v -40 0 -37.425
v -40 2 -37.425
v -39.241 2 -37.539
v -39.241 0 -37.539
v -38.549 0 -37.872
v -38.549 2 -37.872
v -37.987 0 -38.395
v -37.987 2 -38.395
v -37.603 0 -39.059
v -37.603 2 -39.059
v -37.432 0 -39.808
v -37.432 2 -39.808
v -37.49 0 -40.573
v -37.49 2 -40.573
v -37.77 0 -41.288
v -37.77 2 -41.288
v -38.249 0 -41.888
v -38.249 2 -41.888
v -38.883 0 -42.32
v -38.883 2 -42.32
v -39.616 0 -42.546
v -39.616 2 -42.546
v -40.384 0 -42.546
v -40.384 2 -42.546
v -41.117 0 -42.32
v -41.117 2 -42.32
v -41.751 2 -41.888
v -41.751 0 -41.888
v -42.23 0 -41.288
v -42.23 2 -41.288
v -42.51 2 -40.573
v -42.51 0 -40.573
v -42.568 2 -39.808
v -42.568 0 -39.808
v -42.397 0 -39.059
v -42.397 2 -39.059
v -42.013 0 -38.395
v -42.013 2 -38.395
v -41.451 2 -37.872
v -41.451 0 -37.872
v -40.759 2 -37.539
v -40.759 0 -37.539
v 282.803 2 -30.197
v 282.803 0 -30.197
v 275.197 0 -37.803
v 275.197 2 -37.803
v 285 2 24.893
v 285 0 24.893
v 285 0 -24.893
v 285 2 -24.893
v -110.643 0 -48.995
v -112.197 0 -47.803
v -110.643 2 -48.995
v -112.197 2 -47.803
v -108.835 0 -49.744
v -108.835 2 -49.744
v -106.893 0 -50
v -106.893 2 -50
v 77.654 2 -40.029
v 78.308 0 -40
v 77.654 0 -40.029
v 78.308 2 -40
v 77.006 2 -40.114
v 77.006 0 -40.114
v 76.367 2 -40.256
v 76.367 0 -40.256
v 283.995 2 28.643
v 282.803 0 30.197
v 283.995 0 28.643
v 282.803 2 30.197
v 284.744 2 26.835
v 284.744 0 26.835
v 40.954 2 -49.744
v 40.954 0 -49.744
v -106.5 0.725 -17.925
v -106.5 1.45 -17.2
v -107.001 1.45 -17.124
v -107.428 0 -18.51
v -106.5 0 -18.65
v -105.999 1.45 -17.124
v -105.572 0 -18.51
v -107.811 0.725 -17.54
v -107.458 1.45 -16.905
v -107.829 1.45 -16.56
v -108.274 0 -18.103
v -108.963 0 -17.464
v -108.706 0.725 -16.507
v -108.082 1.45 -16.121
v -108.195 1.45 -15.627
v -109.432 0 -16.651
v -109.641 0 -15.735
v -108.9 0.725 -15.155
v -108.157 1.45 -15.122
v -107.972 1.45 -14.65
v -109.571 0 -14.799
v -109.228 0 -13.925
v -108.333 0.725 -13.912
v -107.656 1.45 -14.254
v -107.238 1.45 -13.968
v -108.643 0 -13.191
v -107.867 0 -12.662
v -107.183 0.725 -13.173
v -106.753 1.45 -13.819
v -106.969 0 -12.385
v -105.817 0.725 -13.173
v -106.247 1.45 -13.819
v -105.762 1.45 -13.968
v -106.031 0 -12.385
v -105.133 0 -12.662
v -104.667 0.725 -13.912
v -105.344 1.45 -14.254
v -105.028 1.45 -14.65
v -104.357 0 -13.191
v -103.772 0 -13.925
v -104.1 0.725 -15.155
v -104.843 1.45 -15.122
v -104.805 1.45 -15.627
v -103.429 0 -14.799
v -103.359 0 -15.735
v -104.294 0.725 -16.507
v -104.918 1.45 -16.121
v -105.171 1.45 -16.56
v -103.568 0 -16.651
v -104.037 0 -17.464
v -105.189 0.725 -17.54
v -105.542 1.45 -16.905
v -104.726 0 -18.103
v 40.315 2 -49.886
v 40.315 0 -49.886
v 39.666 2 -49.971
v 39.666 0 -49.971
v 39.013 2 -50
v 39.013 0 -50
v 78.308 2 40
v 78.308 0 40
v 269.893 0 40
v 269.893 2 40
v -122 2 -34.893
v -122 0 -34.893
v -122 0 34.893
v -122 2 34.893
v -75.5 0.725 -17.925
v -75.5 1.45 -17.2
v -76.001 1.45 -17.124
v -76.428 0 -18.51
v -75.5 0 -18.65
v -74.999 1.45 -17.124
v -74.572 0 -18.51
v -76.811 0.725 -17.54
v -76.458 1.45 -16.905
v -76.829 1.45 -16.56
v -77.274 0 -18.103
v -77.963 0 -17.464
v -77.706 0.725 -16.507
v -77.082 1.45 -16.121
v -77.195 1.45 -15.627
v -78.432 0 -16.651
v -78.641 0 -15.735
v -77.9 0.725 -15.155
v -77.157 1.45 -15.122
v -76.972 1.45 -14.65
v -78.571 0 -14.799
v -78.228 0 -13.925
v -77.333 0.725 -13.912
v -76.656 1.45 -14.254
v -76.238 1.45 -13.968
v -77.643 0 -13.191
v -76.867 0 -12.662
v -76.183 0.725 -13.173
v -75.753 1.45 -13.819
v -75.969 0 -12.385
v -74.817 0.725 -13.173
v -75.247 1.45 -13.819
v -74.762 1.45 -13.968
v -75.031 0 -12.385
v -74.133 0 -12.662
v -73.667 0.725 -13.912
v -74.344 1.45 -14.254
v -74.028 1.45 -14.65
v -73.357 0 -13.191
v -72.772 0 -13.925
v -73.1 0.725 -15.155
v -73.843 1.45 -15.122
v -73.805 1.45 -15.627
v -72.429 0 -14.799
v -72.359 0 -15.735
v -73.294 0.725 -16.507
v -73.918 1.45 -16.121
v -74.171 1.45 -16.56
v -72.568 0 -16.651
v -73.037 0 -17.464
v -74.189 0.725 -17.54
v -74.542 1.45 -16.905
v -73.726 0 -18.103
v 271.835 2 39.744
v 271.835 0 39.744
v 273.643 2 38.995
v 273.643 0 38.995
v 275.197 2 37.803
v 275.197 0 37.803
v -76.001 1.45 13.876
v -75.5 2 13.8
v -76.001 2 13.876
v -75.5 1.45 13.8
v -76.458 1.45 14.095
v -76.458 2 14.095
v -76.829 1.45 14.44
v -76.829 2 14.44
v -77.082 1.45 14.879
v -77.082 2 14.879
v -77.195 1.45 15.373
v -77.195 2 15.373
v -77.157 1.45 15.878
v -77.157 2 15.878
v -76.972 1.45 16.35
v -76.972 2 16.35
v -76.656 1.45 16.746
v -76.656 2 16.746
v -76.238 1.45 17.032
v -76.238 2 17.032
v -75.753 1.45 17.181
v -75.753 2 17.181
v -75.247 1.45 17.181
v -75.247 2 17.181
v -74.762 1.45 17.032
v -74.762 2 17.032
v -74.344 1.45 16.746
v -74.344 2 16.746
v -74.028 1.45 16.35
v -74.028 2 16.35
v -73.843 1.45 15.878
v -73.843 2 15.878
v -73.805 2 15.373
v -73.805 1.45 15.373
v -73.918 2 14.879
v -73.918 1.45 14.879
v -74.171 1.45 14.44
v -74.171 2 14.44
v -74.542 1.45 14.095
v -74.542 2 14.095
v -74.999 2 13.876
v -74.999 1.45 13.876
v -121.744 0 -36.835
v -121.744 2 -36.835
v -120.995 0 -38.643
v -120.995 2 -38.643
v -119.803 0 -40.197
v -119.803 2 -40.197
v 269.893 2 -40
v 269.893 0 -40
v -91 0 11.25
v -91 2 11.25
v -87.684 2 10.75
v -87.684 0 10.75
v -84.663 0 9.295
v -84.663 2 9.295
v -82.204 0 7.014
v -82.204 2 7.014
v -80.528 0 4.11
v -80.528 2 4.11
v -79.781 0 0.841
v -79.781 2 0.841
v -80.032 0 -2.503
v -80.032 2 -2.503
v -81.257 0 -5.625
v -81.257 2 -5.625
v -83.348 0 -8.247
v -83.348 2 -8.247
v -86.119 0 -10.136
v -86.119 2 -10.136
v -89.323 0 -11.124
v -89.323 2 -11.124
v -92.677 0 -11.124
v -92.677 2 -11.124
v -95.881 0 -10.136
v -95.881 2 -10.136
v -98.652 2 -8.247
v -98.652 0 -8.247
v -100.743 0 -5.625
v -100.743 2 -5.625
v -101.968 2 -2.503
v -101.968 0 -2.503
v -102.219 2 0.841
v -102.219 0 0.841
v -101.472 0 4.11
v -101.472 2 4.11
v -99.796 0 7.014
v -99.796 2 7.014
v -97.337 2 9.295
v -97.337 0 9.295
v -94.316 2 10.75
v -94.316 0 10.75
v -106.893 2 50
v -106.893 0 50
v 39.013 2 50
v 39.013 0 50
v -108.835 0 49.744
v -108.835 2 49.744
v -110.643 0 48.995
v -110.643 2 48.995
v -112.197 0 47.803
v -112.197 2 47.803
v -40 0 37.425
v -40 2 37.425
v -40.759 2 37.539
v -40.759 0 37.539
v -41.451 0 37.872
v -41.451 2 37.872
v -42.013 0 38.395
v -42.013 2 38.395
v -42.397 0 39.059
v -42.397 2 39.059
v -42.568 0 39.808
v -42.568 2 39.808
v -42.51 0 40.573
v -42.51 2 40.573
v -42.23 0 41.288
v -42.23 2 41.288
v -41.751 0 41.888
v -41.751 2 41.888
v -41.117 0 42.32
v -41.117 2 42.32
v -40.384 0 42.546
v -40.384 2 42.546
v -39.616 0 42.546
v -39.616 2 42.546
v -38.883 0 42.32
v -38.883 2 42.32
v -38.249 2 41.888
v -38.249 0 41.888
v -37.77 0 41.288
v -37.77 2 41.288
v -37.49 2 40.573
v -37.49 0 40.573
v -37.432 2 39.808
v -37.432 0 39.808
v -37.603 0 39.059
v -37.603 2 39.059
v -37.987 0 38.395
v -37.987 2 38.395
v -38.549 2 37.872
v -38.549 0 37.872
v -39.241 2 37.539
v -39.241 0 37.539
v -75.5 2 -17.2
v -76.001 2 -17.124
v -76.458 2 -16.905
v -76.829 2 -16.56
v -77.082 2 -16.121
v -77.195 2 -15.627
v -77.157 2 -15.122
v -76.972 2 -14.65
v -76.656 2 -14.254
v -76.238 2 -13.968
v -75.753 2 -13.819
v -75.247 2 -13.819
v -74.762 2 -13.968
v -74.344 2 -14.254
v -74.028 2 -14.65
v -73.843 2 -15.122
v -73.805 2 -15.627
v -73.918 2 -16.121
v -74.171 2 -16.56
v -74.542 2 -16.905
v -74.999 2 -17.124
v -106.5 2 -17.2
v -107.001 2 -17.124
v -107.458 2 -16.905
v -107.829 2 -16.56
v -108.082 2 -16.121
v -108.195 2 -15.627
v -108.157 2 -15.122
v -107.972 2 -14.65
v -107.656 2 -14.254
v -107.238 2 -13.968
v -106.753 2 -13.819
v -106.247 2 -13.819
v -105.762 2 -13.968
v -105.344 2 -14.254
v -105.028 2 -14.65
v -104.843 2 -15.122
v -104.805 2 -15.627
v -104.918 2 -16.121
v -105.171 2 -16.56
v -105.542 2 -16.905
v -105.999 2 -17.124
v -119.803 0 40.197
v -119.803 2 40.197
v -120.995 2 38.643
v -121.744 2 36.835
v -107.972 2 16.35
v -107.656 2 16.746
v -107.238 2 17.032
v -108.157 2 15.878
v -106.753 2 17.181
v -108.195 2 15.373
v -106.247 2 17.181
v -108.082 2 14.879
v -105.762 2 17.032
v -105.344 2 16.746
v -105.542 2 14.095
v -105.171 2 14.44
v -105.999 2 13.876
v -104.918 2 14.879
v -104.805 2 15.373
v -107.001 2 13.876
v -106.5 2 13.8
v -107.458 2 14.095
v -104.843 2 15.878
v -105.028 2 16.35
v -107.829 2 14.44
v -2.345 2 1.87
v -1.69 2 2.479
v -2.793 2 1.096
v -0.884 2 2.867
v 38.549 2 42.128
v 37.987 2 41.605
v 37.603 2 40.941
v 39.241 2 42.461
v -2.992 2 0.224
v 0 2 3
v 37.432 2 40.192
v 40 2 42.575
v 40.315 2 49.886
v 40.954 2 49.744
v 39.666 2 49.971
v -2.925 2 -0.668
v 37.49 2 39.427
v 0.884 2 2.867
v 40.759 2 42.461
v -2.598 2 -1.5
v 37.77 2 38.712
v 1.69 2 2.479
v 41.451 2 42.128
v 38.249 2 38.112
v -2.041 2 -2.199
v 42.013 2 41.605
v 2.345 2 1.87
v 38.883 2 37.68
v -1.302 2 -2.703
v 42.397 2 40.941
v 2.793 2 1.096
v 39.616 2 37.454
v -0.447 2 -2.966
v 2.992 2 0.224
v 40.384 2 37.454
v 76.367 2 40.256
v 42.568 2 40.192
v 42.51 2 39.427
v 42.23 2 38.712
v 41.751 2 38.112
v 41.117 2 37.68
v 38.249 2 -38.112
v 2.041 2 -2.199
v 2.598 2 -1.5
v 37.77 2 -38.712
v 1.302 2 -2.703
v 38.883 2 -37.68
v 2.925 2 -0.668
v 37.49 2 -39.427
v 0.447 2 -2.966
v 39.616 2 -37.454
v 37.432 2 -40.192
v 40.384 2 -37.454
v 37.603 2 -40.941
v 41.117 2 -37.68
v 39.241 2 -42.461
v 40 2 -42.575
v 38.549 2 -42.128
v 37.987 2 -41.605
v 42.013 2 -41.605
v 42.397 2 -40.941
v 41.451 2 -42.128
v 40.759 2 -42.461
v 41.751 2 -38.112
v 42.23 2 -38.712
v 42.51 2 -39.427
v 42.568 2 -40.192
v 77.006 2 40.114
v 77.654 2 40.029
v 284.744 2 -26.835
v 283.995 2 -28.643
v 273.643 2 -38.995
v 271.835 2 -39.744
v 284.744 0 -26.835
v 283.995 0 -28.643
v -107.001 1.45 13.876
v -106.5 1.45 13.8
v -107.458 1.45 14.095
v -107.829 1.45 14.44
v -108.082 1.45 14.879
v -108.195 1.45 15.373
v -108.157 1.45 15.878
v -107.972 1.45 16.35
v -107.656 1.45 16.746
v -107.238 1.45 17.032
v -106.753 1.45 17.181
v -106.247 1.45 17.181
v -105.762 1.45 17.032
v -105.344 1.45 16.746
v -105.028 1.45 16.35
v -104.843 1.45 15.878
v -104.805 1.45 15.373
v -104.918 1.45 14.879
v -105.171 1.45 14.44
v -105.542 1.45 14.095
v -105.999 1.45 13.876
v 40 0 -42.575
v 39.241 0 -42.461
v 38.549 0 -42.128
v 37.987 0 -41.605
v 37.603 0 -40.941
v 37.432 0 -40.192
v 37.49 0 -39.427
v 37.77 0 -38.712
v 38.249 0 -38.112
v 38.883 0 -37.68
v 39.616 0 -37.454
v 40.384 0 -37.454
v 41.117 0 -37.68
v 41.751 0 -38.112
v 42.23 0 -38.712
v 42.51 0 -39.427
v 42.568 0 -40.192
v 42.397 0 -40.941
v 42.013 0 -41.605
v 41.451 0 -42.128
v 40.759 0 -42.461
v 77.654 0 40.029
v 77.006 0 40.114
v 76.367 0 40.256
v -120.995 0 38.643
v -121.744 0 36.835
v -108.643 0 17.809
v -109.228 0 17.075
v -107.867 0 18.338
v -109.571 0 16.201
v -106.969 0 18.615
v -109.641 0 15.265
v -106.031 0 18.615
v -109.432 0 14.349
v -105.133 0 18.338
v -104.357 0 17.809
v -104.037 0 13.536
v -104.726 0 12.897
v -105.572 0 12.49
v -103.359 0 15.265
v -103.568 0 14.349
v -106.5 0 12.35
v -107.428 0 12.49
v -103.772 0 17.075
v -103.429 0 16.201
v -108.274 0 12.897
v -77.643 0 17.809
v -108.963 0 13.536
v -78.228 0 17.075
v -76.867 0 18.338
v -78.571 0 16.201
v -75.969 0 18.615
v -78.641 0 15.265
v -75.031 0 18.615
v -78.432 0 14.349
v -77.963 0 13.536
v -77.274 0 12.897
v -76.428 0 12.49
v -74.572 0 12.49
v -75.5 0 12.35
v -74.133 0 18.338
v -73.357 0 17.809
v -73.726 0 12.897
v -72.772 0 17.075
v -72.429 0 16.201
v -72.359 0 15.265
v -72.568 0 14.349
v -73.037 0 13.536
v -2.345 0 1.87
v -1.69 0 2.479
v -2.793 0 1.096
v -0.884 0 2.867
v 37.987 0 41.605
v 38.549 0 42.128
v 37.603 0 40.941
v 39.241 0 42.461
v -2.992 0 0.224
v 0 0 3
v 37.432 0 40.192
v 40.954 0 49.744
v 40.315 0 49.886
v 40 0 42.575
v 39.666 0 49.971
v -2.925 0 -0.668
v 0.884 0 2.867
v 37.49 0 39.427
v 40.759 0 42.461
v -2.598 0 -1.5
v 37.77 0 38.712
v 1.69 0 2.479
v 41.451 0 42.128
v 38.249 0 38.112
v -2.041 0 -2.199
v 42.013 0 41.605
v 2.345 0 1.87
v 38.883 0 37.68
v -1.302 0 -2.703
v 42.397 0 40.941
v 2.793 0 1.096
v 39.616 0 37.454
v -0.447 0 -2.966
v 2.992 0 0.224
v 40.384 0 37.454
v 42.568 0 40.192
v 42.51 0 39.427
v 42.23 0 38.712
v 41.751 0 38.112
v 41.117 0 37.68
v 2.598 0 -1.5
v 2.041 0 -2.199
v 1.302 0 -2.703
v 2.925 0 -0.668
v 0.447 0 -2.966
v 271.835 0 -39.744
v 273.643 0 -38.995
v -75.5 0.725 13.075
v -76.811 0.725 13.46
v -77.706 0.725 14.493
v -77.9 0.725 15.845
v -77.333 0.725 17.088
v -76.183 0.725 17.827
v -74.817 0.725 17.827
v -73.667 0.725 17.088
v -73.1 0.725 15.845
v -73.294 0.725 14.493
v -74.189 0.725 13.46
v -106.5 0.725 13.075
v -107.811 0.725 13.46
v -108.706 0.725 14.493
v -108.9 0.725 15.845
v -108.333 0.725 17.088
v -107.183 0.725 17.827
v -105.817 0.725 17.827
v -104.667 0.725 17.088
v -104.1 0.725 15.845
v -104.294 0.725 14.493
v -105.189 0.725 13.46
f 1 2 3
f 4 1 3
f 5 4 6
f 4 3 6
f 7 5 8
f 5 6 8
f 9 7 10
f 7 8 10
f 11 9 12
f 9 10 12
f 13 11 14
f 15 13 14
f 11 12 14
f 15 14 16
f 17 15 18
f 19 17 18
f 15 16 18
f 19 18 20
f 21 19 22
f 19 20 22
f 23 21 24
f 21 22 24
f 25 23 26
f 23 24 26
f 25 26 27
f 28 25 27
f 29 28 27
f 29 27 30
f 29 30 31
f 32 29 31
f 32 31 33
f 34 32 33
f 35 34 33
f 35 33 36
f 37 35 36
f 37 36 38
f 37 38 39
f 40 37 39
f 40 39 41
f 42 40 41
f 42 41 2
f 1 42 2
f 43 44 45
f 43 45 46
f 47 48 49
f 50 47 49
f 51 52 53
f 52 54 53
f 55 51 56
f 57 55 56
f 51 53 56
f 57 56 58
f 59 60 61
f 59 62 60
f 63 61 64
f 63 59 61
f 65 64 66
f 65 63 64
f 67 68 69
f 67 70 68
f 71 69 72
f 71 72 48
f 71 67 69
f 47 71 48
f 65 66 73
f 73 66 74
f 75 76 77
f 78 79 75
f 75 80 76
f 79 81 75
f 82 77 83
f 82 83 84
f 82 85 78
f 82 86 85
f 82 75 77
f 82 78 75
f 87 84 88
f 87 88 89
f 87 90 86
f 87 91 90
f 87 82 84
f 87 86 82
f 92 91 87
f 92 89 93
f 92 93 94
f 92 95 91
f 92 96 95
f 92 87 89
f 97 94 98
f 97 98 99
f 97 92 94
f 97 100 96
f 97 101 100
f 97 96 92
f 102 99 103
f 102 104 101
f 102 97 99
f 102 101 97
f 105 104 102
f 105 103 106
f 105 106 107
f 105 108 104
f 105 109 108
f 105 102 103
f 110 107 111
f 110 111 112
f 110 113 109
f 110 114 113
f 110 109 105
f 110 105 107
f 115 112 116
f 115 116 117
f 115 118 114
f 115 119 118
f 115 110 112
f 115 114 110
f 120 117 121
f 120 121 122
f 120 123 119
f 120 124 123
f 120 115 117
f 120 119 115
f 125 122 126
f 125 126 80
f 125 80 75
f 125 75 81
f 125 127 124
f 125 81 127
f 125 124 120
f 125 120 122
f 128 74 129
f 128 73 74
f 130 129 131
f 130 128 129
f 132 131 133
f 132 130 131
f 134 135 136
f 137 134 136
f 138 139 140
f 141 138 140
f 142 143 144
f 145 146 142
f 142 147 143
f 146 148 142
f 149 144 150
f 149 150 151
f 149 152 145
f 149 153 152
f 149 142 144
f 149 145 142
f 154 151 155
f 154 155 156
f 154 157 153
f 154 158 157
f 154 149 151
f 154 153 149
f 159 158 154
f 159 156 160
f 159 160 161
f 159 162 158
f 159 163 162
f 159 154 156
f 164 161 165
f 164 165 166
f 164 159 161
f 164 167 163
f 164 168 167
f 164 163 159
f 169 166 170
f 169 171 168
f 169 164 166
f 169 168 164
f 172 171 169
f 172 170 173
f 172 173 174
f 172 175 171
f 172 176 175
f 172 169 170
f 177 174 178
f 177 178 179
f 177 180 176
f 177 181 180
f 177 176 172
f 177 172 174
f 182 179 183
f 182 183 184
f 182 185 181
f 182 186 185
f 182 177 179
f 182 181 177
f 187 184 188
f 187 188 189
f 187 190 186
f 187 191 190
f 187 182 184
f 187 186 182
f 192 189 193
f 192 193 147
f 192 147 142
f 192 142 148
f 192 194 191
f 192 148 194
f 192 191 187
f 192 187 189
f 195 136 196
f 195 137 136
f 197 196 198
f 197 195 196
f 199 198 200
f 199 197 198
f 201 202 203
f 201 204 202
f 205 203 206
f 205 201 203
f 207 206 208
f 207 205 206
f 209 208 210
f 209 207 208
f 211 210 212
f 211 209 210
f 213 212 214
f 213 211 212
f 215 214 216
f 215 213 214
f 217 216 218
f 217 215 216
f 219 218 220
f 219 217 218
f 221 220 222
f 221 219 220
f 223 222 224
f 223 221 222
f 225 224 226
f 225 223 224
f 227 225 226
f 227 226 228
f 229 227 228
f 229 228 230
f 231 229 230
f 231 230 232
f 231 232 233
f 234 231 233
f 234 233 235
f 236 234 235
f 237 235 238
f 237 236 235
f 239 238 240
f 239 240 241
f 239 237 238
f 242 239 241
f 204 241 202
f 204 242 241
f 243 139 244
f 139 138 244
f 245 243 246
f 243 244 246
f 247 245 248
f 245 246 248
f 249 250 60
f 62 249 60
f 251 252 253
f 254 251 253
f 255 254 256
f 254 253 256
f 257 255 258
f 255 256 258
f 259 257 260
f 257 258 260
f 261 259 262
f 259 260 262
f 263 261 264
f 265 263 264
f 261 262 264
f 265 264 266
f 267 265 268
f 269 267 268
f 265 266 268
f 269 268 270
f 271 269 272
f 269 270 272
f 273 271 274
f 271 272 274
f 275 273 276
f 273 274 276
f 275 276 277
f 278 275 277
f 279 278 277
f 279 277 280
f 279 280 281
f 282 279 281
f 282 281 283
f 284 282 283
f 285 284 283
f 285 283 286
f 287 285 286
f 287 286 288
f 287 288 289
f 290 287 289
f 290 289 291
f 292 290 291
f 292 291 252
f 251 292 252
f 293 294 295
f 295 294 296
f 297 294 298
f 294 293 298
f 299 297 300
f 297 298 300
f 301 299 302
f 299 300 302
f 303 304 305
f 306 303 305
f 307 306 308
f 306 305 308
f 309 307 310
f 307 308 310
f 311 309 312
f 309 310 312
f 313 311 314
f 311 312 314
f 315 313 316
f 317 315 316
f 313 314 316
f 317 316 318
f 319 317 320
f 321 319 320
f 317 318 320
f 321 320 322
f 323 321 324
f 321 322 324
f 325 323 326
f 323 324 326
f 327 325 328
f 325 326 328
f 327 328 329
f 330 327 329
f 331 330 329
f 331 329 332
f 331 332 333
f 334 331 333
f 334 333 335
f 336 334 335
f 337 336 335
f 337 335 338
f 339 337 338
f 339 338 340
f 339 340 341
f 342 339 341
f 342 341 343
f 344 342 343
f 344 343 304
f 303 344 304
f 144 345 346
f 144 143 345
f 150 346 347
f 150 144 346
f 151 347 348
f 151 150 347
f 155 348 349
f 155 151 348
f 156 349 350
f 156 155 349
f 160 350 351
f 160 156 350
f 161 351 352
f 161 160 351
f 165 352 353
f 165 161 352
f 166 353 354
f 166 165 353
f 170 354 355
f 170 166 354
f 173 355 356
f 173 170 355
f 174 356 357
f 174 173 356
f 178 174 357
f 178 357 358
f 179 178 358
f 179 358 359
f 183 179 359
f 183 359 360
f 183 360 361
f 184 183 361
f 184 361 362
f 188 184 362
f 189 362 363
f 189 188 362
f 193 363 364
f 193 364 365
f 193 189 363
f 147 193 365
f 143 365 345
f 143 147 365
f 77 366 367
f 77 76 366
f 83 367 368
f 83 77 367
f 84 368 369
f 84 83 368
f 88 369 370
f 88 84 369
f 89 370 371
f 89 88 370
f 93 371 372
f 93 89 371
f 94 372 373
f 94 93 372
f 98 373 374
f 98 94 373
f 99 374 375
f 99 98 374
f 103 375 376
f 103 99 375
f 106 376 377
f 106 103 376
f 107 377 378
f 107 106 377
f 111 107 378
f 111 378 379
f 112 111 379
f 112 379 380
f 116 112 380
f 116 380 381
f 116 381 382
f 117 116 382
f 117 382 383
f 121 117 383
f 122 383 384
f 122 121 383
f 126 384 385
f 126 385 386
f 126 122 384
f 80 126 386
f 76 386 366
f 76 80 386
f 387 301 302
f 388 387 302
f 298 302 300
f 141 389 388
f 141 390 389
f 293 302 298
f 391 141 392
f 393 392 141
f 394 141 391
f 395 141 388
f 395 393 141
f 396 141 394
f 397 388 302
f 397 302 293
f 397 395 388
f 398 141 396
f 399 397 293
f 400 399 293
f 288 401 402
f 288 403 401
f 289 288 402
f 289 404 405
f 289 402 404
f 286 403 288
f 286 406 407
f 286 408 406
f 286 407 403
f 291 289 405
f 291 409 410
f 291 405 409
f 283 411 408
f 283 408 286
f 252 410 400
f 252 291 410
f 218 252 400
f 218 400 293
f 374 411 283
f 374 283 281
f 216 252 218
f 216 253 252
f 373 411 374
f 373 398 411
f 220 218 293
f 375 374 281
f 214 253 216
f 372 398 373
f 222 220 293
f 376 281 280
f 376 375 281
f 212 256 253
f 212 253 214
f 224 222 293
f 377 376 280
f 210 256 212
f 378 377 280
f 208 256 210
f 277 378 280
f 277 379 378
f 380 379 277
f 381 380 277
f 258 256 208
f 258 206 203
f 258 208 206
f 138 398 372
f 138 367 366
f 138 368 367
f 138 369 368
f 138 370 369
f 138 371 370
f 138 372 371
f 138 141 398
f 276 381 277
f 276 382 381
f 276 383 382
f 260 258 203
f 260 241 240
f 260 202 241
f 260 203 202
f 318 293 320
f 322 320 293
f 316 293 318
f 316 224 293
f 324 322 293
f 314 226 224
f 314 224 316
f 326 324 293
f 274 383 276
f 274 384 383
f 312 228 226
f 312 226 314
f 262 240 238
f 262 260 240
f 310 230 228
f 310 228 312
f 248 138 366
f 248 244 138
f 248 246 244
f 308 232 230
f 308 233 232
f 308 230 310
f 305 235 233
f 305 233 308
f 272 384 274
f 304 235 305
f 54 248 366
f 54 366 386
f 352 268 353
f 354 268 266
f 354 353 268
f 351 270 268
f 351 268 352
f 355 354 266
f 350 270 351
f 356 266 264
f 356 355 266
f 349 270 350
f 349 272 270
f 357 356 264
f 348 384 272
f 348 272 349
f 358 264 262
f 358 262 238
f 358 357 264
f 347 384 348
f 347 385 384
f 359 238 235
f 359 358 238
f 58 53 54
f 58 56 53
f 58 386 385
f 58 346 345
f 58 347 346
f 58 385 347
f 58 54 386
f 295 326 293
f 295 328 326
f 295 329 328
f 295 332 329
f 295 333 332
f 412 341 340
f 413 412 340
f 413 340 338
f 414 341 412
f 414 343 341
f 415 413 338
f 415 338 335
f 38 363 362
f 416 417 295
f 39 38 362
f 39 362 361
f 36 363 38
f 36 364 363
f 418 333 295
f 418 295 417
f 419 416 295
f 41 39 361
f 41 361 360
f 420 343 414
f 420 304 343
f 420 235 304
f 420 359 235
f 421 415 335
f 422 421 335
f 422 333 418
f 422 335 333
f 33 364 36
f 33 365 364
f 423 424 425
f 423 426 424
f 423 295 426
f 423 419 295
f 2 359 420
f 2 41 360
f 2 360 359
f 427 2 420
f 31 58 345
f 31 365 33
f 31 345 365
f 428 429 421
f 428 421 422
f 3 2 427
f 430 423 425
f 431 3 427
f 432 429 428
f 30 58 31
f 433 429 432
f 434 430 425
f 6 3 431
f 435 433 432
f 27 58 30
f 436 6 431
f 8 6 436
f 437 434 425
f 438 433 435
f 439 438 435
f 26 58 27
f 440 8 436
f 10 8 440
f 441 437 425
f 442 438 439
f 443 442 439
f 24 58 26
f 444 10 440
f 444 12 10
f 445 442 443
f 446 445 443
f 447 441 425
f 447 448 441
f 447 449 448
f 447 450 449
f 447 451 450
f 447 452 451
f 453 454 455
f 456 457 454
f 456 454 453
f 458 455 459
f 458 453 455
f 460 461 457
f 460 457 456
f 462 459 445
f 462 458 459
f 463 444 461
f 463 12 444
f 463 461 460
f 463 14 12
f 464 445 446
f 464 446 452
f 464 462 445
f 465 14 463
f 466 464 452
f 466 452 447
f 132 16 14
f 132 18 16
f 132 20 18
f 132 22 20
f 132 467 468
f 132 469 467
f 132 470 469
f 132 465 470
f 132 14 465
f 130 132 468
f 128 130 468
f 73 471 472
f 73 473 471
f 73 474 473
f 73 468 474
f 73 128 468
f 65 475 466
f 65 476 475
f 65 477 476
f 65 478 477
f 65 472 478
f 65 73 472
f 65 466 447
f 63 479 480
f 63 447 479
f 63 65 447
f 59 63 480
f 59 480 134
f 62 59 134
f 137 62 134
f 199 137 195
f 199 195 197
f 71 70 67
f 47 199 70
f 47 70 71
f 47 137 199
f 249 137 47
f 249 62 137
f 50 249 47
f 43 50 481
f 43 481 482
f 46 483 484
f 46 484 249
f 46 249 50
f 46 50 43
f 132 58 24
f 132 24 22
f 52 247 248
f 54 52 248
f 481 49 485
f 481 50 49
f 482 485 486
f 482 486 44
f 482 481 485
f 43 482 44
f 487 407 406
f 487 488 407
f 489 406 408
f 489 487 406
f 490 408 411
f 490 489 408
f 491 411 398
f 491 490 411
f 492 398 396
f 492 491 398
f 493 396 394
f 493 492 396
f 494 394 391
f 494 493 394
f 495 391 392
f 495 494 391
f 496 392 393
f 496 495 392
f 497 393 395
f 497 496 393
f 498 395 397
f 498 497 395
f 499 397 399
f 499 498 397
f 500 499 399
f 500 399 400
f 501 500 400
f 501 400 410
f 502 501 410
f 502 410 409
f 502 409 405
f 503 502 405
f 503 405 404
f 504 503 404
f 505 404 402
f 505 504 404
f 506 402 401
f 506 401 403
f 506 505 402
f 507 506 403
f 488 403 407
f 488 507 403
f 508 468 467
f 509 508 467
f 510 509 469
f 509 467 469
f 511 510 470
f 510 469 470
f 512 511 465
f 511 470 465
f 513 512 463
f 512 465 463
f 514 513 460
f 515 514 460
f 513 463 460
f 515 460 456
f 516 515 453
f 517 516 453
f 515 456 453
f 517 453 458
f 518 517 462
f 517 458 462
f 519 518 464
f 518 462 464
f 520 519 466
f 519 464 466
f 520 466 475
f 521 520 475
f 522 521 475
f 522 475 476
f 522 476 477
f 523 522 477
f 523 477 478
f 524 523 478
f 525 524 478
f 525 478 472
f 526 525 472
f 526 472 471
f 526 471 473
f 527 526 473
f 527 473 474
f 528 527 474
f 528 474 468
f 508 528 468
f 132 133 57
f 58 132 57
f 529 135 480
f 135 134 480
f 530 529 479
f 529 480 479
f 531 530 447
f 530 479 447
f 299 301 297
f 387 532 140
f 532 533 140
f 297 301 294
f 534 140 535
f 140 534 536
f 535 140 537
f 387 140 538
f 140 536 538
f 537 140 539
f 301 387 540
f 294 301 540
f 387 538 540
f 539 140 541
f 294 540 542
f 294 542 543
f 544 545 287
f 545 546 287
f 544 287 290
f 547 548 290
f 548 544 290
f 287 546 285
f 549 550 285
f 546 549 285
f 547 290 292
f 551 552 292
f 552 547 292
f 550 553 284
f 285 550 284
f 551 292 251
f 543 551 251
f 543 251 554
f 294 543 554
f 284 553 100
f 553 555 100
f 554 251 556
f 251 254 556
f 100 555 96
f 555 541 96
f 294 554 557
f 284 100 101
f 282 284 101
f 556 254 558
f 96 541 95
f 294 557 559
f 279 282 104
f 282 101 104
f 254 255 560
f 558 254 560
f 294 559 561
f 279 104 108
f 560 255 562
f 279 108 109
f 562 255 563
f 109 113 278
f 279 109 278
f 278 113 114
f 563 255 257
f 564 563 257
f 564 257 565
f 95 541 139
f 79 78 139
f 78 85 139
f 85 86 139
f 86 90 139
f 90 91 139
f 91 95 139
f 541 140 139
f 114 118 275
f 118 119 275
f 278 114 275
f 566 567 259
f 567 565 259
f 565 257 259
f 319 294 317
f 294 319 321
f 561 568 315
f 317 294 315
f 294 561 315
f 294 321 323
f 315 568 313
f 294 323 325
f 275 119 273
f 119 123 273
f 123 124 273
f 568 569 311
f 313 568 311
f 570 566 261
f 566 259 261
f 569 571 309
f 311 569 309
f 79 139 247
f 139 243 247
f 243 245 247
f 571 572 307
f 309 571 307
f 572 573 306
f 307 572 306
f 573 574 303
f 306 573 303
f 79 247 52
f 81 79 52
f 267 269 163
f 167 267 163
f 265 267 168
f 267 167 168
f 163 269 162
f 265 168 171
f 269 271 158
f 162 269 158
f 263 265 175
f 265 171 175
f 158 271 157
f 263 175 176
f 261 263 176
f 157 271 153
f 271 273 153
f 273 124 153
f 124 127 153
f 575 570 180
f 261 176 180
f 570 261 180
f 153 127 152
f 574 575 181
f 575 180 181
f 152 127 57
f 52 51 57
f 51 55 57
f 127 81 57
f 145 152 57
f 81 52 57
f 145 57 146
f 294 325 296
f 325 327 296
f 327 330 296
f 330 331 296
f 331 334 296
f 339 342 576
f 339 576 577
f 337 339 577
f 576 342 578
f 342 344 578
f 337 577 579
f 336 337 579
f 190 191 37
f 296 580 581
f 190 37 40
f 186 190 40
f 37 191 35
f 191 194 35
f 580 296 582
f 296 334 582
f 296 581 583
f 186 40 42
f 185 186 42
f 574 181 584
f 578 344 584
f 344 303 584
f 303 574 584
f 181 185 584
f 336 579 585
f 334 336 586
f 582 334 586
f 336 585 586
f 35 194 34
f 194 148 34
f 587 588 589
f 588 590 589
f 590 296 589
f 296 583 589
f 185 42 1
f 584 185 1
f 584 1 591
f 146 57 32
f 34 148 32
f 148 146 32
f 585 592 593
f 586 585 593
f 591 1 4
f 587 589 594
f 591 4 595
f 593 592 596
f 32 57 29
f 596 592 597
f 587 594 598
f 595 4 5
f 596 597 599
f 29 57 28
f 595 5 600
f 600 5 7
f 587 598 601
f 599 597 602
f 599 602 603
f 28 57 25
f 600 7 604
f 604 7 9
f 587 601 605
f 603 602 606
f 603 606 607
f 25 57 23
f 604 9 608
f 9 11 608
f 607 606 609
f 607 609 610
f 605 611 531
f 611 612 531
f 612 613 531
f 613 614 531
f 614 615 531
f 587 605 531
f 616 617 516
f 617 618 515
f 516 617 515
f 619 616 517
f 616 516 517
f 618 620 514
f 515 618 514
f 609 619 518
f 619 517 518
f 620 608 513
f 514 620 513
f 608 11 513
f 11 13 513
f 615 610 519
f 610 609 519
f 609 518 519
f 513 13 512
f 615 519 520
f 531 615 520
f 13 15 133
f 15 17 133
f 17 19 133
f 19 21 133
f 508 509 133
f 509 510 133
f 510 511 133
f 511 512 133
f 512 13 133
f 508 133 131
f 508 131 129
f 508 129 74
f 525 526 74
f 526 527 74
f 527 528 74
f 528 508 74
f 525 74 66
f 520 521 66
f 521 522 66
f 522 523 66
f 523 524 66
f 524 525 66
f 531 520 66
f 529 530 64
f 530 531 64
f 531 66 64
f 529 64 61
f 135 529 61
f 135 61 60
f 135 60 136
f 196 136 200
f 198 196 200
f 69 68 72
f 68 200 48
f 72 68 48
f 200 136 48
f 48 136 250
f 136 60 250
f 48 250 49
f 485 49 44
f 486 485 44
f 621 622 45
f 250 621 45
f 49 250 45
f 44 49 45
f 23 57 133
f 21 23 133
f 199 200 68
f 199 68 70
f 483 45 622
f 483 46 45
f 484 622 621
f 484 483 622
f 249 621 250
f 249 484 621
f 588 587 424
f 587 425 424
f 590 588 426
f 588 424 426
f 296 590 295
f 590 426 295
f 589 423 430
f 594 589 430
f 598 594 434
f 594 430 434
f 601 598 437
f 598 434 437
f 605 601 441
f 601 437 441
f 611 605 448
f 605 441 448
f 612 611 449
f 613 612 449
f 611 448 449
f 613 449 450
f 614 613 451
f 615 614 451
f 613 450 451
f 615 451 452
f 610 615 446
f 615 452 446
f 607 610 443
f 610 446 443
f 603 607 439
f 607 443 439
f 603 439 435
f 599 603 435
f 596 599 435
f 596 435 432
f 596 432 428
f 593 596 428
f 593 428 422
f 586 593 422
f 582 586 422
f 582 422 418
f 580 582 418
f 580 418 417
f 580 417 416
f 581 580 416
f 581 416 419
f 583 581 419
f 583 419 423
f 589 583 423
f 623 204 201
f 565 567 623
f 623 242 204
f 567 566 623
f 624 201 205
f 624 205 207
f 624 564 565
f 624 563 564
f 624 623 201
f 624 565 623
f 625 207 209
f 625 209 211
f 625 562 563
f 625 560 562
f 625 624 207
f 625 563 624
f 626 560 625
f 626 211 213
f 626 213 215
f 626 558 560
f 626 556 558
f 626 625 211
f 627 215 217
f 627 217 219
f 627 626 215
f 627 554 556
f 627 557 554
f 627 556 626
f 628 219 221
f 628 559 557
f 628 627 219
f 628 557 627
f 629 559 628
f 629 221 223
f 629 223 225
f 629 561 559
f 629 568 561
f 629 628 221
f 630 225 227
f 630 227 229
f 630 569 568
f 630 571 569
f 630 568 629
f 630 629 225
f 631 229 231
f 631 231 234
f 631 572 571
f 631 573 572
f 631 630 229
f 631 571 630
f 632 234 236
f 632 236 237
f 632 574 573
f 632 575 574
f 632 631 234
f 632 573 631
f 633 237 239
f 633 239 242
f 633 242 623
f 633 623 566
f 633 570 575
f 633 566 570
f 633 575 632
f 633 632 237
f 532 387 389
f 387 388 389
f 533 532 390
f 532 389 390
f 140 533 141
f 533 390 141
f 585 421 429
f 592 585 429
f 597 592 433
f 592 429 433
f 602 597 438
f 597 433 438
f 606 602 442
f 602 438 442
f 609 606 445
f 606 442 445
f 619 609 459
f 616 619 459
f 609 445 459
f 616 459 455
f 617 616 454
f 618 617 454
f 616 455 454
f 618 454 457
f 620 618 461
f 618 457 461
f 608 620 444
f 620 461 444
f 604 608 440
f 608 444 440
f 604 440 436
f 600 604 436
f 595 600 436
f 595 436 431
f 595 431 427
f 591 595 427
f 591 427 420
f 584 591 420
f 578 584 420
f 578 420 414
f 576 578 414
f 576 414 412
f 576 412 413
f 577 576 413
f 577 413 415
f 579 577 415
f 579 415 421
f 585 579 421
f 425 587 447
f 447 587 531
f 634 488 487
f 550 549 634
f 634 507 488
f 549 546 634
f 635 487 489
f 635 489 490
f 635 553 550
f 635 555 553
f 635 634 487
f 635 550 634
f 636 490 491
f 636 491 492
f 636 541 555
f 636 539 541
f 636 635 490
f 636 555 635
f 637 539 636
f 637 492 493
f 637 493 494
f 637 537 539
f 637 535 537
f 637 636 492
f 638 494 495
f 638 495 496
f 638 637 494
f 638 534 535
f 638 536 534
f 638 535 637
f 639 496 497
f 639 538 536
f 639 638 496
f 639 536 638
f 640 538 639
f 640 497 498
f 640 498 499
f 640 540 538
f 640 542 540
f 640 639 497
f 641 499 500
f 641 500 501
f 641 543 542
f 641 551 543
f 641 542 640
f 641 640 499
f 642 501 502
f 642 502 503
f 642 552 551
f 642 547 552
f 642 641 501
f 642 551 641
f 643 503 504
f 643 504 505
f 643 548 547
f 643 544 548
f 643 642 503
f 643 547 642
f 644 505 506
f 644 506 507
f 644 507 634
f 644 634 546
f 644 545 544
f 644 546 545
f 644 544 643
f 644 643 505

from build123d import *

# Parameters (mm, degrees)
BOSS_EXTRUDE2_DEPTH                          = 2
CHAMFER2_SIZE                                = 12
FILLET1_R                                    = 7.5
SKETCH2_R                                    = 2.575
SKETCH2_R_2                                  = 11.25
SKETCH2_R_3                                  = 3
CUT_EXTRUDE1_DEPTH                           = 290.359637821
CSK_FOR_M3_COUNTERSUNK_FLAT_HEAD_SCR_2_COUNT = 2
CSK_FOR_M3_COUNTERSUNK_FLAT_HEAD_SCR_2_PITCH = 31
CSK_FOR_M3_COUNTERSUNK_FLAT_HEAD_SCR_3_COUNT = 2
CSK_FOR_M3_COUNTERSUNK_FLAT_HEAD_SCR_3_PITCH = 43.840620434
CSK_FOR_M3_COUNTERSUNK_FLAT_HEAD_SCR_4_COUNT = 2
CSK_FOR_M3_COUNTERSUNK_FLAT_HEAD_SCR_4_PITCH = 31


with BuildPart() as part:
    # Sketch1 → Boss-Extrude2 (new body)
    with BuildSketch(Plane(origin=(0, 0, 0), x_dir=(1, 0, 0), z_dir=(0, 1, 0))):
        Polygon((40, -50), (77.320508076, -40), (285, -40), (285, 40), (77.320508076, 40), (40, 50), (-40, 50), (-122, 50), (-122, -50), (-40, -50), align=None)
    extrude(amount=BOSS_EXTRUDE2_DEPTH)

    # Chamfer2
    chamfer2_edges = [part.edges().sort_by_distance(p)[0] for p in [
        (-122, 1, 50),
        (-122, 1, -50),
        (285, 1, -40),
        (285, 1, 40),
    ]]
    chamfer(chamfer2_edges, length=CHAMFER2_SIZE)

    # Fillet1
    fillet1_edges = [part.edges().sort_by_distance(p)[0] for p in [
        (40, 1, -50),
        (77.320508076, 1, -40),
        (77.320508076, 1, 40),
        (40, 1, 50),
        (-110, 1, 50),
        (-122, 1, -38),
        (-122, 1, 38),
        (-110, 1, -50),
        (273, 1, -40),
        (285, 1, 28),
        (285, 1, -28),
        (273, 1, 40),
    ]]
    fillet(fillet1_edges, radius=FILLET1_R)

    # Sketch2 → Cut-Extrude1 (cut, through all)
    with BuildSketch(Plane(origin=(0, 2, 0), x_dir=(1, 0, 0), z_dir=(0, 1, 0))):
        with Locations(Location((-40, 40, 0), (0, 0, 270))):
            Circle(SKETCH2_R)
        with Locations(Location((40, 40, 0), (0, 0, 90))):
            Circle(SKETCH2_R)
        with Locations(Location((40, -40, 0), (0, 0, 270))):
            Circle(SKETCH2_R)
        with Locations(Location((-40, -40, 0), (0, 0, 90))):
            Circle(SKETCH2_R)
        with Locations(Location((-91, 0, 0), (0, 0, 270))):
            Circle(SKETCH2_R_2)
        with Locations(Location((0, 0, 0), (0, 0, 270))):
            Circle(SKETCH2_R_3)
    extrude(amount=-CUT_EXTRUDE1_DEPTH, mode=Mode.SUBTRACT)

    # Sketch4 → CSK for M3 Countersunk Flat Head Screw2 (revolve, cut)
    with BuildSketch(Plane(origin=(-106.5, 0, -15.5), x_dir=(0, 0, -1), z_dir=(1, 0, 0))):
        Polygon((0, 0), (0, 2), (1.7, 2), (1.7, 1.45), (3.15, 0), align=None)
    csk_for_m3_countersunk_flat_head_screw2 = revolve(axis=Axis((-106.5, -6.35, -15.5), (0, 1, 0)), mode=Mode.SUBTRACT)

    # CSK for M3 Countersunk Flat Head Scr 2: CSK for M3 Countersunk Flat Head Screw2 ×2
    with Locations(*[(0, 0, i * CSK_FOR_M3_COUNTERSUNK_FLAT_HEAD_SCR_2_PITCH) for i in range(1, CSK_FOR_M3_COUNTERSUNK_FLAT_HEAD_SCR_2_COUNT)]):
        add(csk_for_m3_countersunk_flat_head_screw2, mode=Mode.SUBTRACT)

    # CSK for M3 Countersunk Flat Head Scr 3: CSK for M3 Countersunk Flat Head Screw2 ×2
    with Locations(*[Vector(0.707106781186545, 0, 0.70710678118655) * (i * CSK_FOR_M3_COUNTERSUNK_FLAT_HEAD_SCR_3_PITCH) for i in range(1, CSK_FOR_M3_COUNTERSUNK_FLAT_HEAD_SCR_3_COUNT)]):
        add(csk_for_m3_countersunk_flat_head_screw2, mode=Mode.SUBTRACT)

    # CSK for M3 Countersunk Flat Head Scr 4: CSK for M3 Countersunk Flat Head Screw2 ×2
    with Locations(*[(i * CSK_FOR_M3_COUNTERSUNK_FLAT_HEAD_SCR_4_PITCH, 0, 0) for i in range(1, CSK_FOR_M3_COUNTERSUNK_FLAT_HEAD_SCR_4_COUNT)]):
        add(csk_for_m3_countersunk_flat_head_screw2, mode=Mode.SUBTRACT)


solid = part.part
